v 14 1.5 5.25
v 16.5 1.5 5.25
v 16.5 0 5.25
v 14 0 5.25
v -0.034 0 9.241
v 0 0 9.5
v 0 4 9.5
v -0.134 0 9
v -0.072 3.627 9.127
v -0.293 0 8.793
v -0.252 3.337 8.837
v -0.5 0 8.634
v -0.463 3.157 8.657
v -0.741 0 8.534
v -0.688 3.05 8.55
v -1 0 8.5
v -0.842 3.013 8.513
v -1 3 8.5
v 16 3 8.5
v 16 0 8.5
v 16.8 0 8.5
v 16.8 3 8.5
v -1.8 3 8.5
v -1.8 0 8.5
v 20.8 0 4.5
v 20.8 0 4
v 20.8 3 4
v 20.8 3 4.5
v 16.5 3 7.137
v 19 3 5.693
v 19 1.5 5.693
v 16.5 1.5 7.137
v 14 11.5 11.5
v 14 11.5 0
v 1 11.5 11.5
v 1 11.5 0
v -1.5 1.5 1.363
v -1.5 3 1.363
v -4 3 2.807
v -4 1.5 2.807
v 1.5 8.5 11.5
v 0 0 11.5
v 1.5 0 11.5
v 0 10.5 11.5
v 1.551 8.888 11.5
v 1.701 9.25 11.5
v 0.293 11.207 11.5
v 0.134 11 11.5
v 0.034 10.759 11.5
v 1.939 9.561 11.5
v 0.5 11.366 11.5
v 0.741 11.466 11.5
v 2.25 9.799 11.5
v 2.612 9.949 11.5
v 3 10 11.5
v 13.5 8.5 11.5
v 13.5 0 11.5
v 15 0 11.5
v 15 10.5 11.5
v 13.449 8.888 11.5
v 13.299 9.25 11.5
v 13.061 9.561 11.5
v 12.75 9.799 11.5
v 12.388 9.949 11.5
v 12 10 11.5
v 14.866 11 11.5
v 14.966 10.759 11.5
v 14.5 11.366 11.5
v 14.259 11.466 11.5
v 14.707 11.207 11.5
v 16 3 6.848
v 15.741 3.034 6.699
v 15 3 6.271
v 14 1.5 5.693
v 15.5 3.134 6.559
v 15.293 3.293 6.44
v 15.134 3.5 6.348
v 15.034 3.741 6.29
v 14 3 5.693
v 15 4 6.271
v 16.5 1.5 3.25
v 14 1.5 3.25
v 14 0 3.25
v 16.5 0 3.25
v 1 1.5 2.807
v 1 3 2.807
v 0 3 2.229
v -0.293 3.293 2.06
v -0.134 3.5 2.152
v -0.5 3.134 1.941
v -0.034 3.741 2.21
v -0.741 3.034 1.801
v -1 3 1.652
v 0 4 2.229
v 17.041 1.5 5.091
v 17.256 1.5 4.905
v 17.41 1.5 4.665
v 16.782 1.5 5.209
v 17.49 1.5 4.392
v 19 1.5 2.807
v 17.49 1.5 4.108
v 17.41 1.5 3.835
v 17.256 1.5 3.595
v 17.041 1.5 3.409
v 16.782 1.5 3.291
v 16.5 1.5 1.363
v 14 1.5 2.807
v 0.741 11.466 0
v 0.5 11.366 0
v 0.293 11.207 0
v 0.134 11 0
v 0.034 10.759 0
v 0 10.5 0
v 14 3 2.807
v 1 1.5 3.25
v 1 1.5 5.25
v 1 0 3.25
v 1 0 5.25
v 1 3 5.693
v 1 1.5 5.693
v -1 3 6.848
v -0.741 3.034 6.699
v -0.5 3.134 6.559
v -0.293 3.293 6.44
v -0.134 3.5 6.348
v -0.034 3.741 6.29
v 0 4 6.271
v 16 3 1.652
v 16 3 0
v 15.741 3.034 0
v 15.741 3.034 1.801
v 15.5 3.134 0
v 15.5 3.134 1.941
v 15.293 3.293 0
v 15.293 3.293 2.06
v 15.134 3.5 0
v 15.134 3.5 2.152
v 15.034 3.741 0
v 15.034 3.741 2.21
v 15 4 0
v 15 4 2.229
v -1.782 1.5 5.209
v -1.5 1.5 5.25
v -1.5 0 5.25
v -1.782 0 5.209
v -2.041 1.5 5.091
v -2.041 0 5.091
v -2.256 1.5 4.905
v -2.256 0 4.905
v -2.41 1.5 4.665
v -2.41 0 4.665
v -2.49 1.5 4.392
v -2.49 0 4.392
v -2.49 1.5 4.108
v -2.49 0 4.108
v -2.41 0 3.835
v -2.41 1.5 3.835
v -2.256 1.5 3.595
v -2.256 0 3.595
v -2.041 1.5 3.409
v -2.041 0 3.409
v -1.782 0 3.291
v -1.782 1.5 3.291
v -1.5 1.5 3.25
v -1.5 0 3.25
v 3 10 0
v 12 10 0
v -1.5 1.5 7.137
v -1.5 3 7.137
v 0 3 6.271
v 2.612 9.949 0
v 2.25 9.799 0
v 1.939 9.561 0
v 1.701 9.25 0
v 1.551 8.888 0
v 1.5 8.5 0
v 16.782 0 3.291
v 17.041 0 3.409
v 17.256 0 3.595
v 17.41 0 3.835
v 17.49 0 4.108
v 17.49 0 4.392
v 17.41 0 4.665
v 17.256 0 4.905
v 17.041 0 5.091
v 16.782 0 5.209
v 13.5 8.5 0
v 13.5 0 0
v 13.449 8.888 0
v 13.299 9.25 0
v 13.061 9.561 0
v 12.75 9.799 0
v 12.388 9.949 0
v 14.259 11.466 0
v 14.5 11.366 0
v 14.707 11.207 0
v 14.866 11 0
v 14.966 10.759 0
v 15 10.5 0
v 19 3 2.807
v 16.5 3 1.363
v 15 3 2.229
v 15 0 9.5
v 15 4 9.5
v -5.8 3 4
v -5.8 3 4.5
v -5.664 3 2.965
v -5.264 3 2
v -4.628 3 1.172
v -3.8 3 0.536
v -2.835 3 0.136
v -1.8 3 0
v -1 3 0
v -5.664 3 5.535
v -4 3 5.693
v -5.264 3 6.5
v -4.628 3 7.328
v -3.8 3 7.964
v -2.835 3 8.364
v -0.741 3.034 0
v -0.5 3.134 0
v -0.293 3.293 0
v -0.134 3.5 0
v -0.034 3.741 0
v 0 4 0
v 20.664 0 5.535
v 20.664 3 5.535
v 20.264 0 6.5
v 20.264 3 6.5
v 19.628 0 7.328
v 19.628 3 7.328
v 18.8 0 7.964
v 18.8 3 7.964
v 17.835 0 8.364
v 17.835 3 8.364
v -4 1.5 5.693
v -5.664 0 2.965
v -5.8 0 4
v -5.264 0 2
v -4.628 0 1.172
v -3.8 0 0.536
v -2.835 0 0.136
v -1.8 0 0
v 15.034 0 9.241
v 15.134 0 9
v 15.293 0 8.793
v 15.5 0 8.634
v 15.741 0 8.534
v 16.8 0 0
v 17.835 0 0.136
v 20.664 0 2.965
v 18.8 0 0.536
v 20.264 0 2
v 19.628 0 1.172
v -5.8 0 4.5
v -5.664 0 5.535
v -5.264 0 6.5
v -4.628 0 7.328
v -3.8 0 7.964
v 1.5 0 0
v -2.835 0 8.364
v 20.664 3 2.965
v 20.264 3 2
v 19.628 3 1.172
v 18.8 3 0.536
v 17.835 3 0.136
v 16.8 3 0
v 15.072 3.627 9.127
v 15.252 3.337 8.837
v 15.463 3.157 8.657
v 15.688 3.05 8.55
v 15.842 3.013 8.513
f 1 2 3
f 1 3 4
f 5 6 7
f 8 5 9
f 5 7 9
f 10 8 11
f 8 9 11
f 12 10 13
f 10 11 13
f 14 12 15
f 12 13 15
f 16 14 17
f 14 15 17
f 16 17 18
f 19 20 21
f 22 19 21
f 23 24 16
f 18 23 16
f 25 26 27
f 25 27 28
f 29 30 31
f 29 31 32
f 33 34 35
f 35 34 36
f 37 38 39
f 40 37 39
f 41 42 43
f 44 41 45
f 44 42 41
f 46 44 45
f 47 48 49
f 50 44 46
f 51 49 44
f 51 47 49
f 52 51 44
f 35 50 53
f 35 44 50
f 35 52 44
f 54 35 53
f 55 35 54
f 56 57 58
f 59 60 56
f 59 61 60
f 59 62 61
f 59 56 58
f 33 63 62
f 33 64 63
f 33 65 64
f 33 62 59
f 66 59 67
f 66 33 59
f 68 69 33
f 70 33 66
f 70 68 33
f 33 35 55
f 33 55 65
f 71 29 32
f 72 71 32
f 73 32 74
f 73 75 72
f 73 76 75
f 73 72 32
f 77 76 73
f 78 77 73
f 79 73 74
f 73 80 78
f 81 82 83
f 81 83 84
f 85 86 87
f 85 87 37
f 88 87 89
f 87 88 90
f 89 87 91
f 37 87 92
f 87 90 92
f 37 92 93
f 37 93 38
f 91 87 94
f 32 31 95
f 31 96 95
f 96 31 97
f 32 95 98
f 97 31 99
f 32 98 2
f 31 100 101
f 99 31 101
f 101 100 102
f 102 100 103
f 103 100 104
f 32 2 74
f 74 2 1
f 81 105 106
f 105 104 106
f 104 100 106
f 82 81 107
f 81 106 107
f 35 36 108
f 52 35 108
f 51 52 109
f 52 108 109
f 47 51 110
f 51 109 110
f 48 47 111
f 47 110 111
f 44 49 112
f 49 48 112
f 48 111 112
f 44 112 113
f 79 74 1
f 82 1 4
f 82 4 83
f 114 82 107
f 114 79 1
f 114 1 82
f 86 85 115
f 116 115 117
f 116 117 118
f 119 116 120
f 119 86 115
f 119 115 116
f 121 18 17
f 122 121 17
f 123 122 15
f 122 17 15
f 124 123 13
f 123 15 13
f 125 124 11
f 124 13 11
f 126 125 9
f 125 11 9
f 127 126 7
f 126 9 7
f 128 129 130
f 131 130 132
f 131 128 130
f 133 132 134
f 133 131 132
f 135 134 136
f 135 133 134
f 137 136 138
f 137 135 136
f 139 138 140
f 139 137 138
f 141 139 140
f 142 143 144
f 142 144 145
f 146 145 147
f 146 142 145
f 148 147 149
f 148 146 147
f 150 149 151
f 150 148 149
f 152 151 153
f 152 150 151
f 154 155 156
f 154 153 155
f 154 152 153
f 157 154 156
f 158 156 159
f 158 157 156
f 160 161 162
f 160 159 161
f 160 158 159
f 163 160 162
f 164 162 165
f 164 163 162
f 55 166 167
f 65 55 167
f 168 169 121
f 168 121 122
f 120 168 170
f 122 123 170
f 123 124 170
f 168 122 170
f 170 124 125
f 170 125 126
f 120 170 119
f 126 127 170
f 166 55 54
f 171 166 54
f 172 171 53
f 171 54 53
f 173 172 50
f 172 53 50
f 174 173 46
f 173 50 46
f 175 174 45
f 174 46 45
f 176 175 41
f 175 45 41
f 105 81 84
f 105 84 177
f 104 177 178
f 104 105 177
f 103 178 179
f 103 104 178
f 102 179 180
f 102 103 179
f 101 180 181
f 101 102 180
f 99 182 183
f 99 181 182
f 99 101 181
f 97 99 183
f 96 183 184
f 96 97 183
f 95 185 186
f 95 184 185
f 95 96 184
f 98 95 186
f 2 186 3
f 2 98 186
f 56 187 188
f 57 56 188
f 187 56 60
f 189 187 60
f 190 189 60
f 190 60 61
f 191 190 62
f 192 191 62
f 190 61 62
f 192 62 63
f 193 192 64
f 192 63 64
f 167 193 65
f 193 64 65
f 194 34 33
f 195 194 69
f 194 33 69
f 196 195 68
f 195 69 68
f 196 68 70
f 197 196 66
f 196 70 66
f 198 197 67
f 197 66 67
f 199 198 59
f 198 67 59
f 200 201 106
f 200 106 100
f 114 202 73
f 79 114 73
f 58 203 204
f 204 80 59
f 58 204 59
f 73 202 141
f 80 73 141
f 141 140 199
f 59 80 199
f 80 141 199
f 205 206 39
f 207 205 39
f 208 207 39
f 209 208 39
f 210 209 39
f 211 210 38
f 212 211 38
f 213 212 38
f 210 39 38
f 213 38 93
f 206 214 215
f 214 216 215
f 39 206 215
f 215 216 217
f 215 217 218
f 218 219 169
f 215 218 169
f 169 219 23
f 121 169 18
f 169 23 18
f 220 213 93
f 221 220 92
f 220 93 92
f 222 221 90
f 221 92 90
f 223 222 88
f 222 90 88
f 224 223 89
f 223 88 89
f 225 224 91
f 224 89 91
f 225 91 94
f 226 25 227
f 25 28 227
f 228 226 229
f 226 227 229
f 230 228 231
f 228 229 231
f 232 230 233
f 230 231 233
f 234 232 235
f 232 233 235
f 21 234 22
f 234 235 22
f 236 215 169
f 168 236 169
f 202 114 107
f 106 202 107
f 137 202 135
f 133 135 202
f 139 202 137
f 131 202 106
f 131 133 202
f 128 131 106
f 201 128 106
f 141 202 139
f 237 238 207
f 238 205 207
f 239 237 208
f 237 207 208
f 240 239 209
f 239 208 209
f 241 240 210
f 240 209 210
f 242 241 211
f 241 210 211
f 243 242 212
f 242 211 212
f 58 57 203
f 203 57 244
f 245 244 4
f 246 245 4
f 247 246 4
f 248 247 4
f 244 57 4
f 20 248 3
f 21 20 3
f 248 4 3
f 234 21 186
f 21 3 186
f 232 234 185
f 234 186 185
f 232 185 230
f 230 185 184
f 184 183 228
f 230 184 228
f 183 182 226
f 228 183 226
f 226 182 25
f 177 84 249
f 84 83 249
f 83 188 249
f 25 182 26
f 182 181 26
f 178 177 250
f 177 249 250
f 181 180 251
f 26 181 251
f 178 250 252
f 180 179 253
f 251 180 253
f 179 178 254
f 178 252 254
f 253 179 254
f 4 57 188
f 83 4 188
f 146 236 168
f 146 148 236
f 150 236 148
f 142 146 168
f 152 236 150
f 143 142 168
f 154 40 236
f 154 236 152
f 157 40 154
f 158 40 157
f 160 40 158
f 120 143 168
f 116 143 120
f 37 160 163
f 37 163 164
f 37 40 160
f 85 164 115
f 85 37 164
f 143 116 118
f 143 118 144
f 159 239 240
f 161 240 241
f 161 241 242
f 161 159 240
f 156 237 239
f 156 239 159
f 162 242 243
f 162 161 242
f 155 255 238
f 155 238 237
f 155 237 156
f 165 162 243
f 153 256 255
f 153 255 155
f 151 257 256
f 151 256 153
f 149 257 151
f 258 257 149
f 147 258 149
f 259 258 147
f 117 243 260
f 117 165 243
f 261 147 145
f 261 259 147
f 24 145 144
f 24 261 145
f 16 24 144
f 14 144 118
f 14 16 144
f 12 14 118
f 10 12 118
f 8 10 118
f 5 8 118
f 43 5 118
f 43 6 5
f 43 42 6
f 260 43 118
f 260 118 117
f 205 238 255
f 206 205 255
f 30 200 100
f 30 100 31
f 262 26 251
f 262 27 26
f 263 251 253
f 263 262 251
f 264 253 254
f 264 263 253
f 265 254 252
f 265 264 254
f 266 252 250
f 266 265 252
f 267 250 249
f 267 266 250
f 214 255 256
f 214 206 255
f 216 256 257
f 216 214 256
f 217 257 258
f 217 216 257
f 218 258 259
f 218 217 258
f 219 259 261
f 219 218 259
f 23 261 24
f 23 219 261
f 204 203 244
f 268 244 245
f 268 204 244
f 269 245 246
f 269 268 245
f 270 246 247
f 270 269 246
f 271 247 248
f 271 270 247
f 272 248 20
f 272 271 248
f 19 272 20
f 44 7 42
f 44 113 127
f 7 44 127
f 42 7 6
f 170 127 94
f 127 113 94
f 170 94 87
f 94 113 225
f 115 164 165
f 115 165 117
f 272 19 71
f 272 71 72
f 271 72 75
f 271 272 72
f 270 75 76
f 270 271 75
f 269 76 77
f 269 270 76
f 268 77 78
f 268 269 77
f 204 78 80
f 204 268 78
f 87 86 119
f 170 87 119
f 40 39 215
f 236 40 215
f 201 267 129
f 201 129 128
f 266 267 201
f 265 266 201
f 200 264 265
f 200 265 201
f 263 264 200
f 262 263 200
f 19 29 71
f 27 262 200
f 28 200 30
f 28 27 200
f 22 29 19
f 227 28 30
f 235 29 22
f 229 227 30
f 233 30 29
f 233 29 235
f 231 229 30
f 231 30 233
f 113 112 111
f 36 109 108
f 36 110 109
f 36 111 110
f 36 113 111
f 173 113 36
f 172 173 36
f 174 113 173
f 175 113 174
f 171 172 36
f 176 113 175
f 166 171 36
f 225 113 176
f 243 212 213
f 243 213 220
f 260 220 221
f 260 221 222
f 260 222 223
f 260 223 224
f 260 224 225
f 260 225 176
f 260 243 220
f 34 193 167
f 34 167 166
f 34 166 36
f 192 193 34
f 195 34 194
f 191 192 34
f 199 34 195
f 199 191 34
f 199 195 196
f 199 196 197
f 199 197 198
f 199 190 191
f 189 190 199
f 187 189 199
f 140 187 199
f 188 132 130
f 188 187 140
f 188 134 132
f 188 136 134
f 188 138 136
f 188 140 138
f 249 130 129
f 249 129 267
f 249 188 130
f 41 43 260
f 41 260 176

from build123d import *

# Parameters (mm, degrees)
BOSS_EXTRUDE1_DEPTH    = 17
SPLIT2_SURFACE_1_BACK  = 26.421
SPLIT2_SURFACE_1_DEPTH = 52.842
SPLIT2_SURFACE_2_BACK  = 26.421
SPLIT2_SURFACE_2_DEPTH = 52.842
SKETCH13_W             = 5.8
SKETCH13_H             = 8.5
BOSS_EXTRUDE10_DEPTH   = 3
FILLET7_R              = 4
SPLIT3_SURFACE_3_BACK  = 34.598
SPLIT3_SURFACE_3_DEPTH = 69.196
SPLIT3_SURFACE_4_BACK  = 34.598
SPLIT3_SURFACE_4_DEPTH = 69.196
CUT_EXTRUDE1_DEPTH     = 1.5
CUT_EXTRUDE2_DEPTH     = 29.664263465
FILLET_1_R             = 1
FILLET_2_R             = 1
FILLET_3_R             = 1.5
CUT_EXTRUDE_START      = 11.5
SKETCH_1_W             = 75.774826167
SKETCH_1_H             = 36.419346407
CUT_EXTRUDE_1_DEPTH    = 10


with BuildPart() as part:
    # Sketch1 → Boss-Extrude1 (new body)
    with BuildSketch(Plane.XY):
        Polygon((0, 0), (1.5, 0), (1.5, 10), (13.5, 10), (13.5, 0), (15, 0), (15, 11.5), (0, 11.5), (0, 10), align=None)
    extrude(amount=BOSS_EXTRUDE1_DEPTH)


with BuildPart() as body_2:
    # Split2: the piece behind the surface
    add(part.part)
    # Split2 surface: a surface, the sketch's curves swept straight by 52.842 mm
    with BuildLine(Plane.XZ.offset(-SPLIT2_SURFACE_1_BACK), mode=Mode.PRIVATE) as split2_surface_1_path:
        Line((15, 8), (0, 8))
    split2_surface_1 = Shell.extrude(split2_surface_1_path.wire(), (0 * SPLIT2_SURFACE_1_DEPTH, -1 * SPLIT2_SURFACE_1_DEPTH, 0 * SPLIT2_SURFACE_1_DEPTH))
    split(bisect_by=split2_surface_1, keep=Keep.BOTTOM)


with BuildPart() as part_1:
    add(part.part)

    # Split2: split by a surface, the side it looks to stays
    # Split2 surface: a surface, the sketch's curves swept straight by 52.842 mm
    with BuildLine(Plane.XZ.offset(-SPLIT2_SURFACE_2_BACK), mode=Mode.PRIVATE) as split2_surface_2_path:
        Line((15, 8), (0, 8))
    split2_surface_2 = Shell.extrude(split2_surface_2_path.wire(), (0 * SPLIT2_SURFACE_2_DEPTH, -1 * SPLIT2_SURFACE_2_DEPTH, 0 * SPLIT2_SURFACE_2_DEPTH))
    split(bisect_by=split2_surface_2, keep=Keep.TOP)


with BuildPart() as body_2_1:
    add(body_2.part)

    # Combine2: union part
    add(part_1.part)

    # Sketch13 → Boss-Extrude10 (add)
    with BuildSketch(Plane.XZ):
        with Locations((-2.9, 4.25)):
            Rectangle(SKETCH13_W, SKETCH13_H)
        with Locations((17.9, 4.25)):
            Rectangle(SKETCH13_W, SKETCH13_H)
    extrude(amount=-BOSS_EXTRUDE10_DEPTH)

    # Fillet7
    fillet7_edges = [body_2_1.edges().sort_by_distance(p)[0] for p in [
        (20.8, 1.5, 8.5),
        (20.8, 1.5, 0),
        (-5.8, 1.5, 0),
        (-5.8, 1.5, 8.5),
    ]]
    fillet(fillet7_edges, radius=FILLET7_R)


with BuildPart() as body_2_2:
    # Split3: the piece behind the surface
    add(body_2_1.part)
    # Split3 surface: a surface, the sketch's curves swept straight by 69.196 mm
    with BuildLine(Plane.ZY.offset(-SPLIT3_SURFACE_3_BACK), mode=Mode.PRIVATE) as split3_surface_3_path:
        Line((0, 3), (17, 3))
    split3_surface_3 = Shell.extrude(split3_surface_3_path.wire(), (-1 * SPLIT3_SURFACE_3_DEPTH, 0 * SPLIT3_SURFACE_3_DEPTH, 0 * SPLIT3_SURFACE_3_DEPTH))
    split(bisect_by=split3_surface_3, keep=Keep.BOTTOM)

    # Sketch16 → Cut-Extrude1 (cut)
    with BuildSketch(Plane(origin=(0, 3, 0), x_dir=(1, 0, 0), z_dir=(0, 1, 0))):
        Polygon((-4, -2.806624327), (-4, -5.693375673), (-1.5, -7.136751346), (1, -5.693375673), (1, -2.806624327), (-1.5, -1.363248654), align=None)
        Polygon((14, -5.693375673), (14, -2.806624327), (16.5, -1.363248654), (19, -2.806624327), (19, -5.693375673), (16.5, -7.136751346), align=None)
    extrude(amount=-CUT_EXTRUDE1_DEPTH, mode=Mode.SUBTRACT)

    # Sketch17 → Cut-Extrude2 (cut, through all)
    with BuildSketch(Plane(origin=(0, 1.5, 0), x_dir=(1, 0, 0), z_dir=(0, 1, 0))):
        with BuildLine():
            Line((16.5, -5.25), (14, -5.25))
            Line((14, -5.25), (14, -3.25))
            Line((14, -3.25), (16.5, -3.25))
            ThreePointArc((16.5, -3.25), (17.5, -4.25), (16.5, -5.25))
        make_face()
        with BuildLine():
            Line((1, -3.25), (1, -5.25))
            Line((1, -5.25), (-1.5, -5.25))
            ThreePointArc((-1.5, -5.25), (-2.5, -4.25), (-1.5, -3.25))
            Line((-1.5, -3.25), (1, -3.25))
        make_face()
    extrude(amount=-CUT_EXTRUDE2_DEPTH, mode=Mode.SUBTRACT)


with BuildPart() as body_2_3:
    add(body_2_1.part)

    # Split3: split by a surface, the side it looks to stays
    # Split3 surface: a surface, the sketch's curves swept straight by 69.196 mm
    with BuildLine(Plane.ZY.offset(-SPLIT3_SURFACE_4_BACK), mode=Mode.PRIVATE) as split3_surface_4_path:
        Line((0, 3), (17, 3))
    split3_surface_4 = Shell.extrude(split3_surface_4_path.wire(), (-1 * SPLIT3_SURFACE_4_DEPTH, 0 * SPLIT3_SURFACE_4_DEPTH, 0 * SPLIT3_SURFACE_4_DEPTH))
    split(bisect_by=split3_surface_4, keep=Keep.TOP)

    # Combine3: union body 2 2
    add(body_2_2.part)

    # Скругление1
    fillet_1_edges = [body_2_3.edges().sort_by_distance(p)[0] for p in [
        (0, 3, 1.114637029),
        (0, 3, 7.385362971),
        (15, 3, 7.385362971),
        (15, 3, 1.114637029),
    ]]
    fillet(fillet_1_edges, radius=FILLET_1_R)

    # Скругление2
    fillet_2_edges = [body_2_3.edges().sort_by_distance(p)[0] for p in [
        (0, 2, 8.5),
        (15, 2, 8.5),
        (0, 11.5, 8.5),
        (15, 11.5, 8.5),
    ]]
    fillet(fillet_2_edges, radius=FILLET_2_R)

    # Скругление3
    fillet_3_edges = [body_2_3.edges().sort_by_distance(p)[0] for p in [
        (13.5, 10, 8.5),
        (1.5, 10, 8.5),
    ]]
    fillet(fillet_3_edges, radius=FILLET_3_R)

    # Эскиз1 → Вырез-Вытянуть1 (cut)
    with BuildSketch(Plane.XY.offset(CUT_EXTRUDE_START)):
        with Locations((-10.82260141, 13.923178903)):
            Rectangle(SKETCH_1_W, SKETCH_1_H)
    extrude(amount=CUT_EXTRUDE_1_DEPTH, mode=Mode.SUBTRACT)


solid = body_2_3.part
